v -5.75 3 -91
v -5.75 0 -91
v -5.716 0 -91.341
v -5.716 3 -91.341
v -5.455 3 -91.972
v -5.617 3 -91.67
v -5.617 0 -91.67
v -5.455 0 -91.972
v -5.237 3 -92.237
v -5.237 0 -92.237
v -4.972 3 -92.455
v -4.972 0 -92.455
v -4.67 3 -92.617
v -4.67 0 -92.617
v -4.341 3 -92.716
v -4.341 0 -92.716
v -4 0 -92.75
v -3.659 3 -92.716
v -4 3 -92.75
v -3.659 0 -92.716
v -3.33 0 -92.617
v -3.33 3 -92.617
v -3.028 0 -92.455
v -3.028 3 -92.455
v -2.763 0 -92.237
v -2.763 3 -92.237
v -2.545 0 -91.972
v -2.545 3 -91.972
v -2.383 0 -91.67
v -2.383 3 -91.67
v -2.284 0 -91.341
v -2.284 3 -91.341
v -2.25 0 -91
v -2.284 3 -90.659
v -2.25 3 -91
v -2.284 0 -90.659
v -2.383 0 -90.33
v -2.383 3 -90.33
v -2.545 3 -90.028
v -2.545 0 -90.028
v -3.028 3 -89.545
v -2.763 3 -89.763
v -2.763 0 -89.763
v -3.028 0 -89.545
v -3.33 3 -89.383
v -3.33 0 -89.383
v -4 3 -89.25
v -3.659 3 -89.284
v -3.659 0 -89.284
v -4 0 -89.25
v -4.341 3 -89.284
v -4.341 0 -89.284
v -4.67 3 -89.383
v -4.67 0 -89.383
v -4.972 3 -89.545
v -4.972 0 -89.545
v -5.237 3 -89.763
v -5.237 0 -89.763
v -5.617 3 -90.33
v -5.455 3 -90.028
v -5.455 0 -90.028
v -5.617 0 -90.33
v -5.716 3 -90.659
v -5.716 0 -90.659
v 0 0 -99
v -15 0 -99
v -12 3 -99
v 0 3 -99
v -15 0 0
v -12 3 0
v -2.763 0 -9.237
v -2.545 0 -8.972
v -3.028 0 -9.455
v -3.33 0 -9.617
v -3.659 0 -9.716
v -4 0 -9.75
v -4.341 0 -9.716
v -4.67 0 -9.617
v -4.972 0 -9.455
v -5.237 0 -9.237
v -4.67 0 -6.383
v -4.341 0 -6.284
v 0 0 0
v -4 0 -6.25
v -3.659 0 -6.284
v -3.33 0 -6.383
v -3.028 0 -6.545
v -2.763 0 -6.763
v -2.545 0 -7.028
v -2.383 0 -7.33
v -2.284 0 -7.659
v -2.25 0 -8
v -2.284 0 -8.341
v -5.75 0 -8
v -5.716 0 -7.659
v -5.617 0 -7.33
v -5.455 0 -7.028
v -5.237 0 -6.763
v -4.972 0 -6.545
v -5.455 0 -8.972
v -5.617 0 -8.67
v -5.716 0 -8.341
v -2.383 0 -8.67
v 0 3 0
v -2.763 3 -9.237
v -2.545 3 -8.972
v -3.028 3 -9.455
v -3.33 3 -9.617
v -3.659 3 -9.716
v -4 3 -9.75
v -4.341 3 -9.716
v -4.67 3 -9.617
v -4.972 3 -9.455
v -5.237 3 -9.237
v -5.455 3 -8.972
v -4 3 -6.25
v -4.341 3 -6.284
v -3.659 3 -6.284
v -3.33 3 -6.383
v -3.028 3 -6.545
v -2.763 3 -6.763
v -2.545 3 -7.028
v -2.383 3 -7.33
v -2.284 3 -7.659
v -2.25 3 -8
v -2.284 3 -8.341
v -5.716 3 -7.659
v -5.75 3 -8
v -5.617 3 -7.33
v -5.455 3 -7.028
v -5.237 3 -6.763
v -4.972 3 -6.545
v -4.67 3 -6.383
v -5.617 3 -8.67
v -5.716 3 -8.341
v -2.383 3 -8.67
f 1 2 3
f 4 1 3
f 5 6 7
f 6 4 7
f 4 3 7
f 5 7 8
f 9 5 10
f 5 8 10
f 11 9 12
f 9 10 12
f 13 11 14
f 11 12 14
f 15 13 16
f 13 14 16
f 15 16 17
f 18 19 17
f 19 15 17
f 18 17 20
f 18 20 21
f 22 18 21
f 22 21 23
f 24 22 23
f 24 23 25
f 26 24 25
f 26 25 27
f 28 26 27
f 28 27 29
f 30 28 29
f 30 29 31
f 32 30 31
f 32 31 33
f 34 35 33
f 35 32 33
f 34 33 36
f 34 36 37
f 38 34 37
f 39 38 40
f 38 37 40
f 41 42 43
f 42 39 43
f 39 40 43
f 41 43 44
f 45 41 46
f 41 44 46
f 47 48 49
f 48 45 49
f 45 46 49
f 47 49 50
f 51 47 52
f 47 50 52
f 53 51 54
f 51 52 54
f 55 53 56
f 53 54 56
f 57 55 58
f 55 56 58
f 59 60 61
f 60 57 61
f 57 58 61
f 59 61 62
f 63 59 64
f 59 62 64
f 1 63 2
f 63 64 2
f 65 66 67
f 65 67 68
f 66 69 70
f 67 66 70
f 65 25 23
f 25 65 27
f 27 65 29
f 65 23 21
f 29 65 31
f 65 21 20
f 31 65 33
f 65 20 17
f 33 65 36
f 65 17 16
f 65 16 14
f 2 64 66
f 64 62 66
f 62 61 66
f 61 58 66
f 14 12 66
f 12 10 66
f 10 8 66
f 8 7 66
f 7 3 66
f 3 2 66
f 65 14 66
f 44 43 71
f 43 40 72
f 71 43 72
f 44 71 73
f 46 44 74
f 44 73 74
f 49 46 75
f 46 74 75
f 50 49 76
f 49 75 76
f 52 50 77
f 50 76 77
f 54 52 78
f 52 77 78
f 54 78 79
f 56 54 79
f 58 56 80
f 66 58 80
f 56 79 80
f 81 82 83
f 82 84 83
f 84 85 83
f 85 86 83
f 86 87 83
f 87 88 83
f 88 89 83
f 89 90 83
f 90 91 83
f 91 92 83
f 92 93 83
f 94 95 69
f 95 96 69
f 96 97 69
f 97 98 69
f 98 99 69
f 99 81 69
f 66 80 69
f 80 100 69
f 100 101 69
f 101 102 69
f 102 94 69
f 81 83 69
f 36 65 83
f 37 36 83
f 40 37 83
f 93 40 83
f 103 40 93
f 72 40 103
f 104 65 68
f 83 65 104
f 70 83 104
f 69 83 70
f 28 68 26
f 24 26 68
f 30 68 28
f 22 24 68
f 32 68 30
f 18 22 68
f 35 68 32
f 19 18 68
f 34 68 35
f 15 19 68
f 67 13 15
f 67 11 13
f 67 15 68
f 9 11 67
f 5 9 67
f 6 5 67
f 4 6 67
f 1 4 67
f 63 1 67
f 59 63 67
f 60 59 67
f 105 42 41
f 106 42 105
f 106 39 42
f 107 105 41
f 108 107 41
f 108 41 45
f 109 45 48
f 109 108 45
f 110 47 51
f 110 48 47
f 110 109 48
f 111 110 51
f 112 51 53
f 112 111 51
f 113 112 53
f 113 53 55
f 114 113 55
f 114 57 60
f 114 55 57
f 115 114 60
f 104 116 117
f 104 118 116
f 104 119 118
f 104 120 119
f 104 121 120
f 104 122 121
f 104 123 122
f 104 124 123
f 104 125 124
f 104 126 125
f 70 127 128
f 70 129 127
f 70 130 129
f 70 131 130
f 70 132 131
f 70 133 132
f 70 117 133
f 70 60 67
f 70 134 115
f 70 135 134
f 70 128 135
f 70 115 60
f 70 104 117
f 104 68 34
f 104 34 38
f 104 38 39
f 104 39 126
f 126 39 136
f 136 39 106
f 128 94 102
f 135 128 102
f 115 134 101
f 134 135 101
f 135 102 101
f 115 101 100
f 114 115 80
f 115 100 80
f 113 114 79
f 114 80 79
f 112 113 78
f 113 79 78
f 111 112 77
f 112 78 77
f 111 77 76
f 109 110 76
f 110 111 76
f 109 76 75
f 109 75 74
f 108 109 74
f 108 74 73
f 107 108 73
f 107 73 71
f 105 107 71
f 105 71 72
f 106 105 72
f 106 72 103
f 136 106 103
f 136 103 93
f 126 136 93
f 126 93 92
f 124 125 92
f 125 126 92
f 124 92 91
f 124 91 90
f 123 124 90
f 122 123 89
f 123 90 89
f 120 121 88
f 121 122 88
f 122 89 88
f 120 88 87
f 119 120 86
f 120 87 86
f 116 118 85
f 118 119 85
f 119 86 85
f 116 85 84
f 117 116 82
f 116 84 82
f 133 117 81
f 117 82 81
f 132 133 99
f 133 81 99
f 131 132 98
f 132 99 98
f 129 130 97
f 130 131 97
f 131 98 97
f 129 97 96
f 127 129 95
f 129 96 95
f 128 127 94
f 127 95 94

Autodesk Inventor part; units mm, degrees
ref_plane "YZ Plane" through (0, 0, 0) normal (1, 0, 0) x (0, 1, 0)
ref_plane "XZ Plane" through (0, 0, 0) normal (0, 1, 0) x (-1, 0, 0)
ref_plane "XY Plane" through (0, 0, 0) normal (0, 0, 1) x (1, 0, 0)
sketch "Sketch1" plane through (0, 0, 0) normal (0, 1, 0) x (-1, 0, 0)
  line L0 (0, 0) -> (15, 0)
  line L1 (15, 0) -> (15, -99)
  line L2 (15, -99) -> (0, -99)
  line L3 (0, -99) -> (0, 0)
  circle A0 centre (4, -8) radius 1.75
  circle A1 centre (4, -91) radius 1.75
  dimension "d0" = 99
  dimension "d1" = 15
  dimension "d2" = 8
  dimension "d3" = 83
  dimension "d4" = 4
  dimension "d5" = 4
  dimension "d6" = 3.5
  dimension "d7" = 3.5
extrude "Extrusion1" add sketch "Sketch1" along normal blind 3
sketch "Sketch2" plane through (-15, 0, 0) normal (0, 0, 1) x (1, 0, 0)
  line L0 (0, 0) -> (3, 3)
  line L1 (0, 0) -> (15, 0) projected
  line L2 (0, 3) -> (15, 3) projected
  line L3 (3, 3) -> (0, 3)
  line L4 (0, 3) -> (0, 0)
  dimension "d10" = 45
extrude "Extrusion2" cut sketch "Sketch2" against normal up to surface (99 mm away)
properties part number "Cuchilla Versión 1"
